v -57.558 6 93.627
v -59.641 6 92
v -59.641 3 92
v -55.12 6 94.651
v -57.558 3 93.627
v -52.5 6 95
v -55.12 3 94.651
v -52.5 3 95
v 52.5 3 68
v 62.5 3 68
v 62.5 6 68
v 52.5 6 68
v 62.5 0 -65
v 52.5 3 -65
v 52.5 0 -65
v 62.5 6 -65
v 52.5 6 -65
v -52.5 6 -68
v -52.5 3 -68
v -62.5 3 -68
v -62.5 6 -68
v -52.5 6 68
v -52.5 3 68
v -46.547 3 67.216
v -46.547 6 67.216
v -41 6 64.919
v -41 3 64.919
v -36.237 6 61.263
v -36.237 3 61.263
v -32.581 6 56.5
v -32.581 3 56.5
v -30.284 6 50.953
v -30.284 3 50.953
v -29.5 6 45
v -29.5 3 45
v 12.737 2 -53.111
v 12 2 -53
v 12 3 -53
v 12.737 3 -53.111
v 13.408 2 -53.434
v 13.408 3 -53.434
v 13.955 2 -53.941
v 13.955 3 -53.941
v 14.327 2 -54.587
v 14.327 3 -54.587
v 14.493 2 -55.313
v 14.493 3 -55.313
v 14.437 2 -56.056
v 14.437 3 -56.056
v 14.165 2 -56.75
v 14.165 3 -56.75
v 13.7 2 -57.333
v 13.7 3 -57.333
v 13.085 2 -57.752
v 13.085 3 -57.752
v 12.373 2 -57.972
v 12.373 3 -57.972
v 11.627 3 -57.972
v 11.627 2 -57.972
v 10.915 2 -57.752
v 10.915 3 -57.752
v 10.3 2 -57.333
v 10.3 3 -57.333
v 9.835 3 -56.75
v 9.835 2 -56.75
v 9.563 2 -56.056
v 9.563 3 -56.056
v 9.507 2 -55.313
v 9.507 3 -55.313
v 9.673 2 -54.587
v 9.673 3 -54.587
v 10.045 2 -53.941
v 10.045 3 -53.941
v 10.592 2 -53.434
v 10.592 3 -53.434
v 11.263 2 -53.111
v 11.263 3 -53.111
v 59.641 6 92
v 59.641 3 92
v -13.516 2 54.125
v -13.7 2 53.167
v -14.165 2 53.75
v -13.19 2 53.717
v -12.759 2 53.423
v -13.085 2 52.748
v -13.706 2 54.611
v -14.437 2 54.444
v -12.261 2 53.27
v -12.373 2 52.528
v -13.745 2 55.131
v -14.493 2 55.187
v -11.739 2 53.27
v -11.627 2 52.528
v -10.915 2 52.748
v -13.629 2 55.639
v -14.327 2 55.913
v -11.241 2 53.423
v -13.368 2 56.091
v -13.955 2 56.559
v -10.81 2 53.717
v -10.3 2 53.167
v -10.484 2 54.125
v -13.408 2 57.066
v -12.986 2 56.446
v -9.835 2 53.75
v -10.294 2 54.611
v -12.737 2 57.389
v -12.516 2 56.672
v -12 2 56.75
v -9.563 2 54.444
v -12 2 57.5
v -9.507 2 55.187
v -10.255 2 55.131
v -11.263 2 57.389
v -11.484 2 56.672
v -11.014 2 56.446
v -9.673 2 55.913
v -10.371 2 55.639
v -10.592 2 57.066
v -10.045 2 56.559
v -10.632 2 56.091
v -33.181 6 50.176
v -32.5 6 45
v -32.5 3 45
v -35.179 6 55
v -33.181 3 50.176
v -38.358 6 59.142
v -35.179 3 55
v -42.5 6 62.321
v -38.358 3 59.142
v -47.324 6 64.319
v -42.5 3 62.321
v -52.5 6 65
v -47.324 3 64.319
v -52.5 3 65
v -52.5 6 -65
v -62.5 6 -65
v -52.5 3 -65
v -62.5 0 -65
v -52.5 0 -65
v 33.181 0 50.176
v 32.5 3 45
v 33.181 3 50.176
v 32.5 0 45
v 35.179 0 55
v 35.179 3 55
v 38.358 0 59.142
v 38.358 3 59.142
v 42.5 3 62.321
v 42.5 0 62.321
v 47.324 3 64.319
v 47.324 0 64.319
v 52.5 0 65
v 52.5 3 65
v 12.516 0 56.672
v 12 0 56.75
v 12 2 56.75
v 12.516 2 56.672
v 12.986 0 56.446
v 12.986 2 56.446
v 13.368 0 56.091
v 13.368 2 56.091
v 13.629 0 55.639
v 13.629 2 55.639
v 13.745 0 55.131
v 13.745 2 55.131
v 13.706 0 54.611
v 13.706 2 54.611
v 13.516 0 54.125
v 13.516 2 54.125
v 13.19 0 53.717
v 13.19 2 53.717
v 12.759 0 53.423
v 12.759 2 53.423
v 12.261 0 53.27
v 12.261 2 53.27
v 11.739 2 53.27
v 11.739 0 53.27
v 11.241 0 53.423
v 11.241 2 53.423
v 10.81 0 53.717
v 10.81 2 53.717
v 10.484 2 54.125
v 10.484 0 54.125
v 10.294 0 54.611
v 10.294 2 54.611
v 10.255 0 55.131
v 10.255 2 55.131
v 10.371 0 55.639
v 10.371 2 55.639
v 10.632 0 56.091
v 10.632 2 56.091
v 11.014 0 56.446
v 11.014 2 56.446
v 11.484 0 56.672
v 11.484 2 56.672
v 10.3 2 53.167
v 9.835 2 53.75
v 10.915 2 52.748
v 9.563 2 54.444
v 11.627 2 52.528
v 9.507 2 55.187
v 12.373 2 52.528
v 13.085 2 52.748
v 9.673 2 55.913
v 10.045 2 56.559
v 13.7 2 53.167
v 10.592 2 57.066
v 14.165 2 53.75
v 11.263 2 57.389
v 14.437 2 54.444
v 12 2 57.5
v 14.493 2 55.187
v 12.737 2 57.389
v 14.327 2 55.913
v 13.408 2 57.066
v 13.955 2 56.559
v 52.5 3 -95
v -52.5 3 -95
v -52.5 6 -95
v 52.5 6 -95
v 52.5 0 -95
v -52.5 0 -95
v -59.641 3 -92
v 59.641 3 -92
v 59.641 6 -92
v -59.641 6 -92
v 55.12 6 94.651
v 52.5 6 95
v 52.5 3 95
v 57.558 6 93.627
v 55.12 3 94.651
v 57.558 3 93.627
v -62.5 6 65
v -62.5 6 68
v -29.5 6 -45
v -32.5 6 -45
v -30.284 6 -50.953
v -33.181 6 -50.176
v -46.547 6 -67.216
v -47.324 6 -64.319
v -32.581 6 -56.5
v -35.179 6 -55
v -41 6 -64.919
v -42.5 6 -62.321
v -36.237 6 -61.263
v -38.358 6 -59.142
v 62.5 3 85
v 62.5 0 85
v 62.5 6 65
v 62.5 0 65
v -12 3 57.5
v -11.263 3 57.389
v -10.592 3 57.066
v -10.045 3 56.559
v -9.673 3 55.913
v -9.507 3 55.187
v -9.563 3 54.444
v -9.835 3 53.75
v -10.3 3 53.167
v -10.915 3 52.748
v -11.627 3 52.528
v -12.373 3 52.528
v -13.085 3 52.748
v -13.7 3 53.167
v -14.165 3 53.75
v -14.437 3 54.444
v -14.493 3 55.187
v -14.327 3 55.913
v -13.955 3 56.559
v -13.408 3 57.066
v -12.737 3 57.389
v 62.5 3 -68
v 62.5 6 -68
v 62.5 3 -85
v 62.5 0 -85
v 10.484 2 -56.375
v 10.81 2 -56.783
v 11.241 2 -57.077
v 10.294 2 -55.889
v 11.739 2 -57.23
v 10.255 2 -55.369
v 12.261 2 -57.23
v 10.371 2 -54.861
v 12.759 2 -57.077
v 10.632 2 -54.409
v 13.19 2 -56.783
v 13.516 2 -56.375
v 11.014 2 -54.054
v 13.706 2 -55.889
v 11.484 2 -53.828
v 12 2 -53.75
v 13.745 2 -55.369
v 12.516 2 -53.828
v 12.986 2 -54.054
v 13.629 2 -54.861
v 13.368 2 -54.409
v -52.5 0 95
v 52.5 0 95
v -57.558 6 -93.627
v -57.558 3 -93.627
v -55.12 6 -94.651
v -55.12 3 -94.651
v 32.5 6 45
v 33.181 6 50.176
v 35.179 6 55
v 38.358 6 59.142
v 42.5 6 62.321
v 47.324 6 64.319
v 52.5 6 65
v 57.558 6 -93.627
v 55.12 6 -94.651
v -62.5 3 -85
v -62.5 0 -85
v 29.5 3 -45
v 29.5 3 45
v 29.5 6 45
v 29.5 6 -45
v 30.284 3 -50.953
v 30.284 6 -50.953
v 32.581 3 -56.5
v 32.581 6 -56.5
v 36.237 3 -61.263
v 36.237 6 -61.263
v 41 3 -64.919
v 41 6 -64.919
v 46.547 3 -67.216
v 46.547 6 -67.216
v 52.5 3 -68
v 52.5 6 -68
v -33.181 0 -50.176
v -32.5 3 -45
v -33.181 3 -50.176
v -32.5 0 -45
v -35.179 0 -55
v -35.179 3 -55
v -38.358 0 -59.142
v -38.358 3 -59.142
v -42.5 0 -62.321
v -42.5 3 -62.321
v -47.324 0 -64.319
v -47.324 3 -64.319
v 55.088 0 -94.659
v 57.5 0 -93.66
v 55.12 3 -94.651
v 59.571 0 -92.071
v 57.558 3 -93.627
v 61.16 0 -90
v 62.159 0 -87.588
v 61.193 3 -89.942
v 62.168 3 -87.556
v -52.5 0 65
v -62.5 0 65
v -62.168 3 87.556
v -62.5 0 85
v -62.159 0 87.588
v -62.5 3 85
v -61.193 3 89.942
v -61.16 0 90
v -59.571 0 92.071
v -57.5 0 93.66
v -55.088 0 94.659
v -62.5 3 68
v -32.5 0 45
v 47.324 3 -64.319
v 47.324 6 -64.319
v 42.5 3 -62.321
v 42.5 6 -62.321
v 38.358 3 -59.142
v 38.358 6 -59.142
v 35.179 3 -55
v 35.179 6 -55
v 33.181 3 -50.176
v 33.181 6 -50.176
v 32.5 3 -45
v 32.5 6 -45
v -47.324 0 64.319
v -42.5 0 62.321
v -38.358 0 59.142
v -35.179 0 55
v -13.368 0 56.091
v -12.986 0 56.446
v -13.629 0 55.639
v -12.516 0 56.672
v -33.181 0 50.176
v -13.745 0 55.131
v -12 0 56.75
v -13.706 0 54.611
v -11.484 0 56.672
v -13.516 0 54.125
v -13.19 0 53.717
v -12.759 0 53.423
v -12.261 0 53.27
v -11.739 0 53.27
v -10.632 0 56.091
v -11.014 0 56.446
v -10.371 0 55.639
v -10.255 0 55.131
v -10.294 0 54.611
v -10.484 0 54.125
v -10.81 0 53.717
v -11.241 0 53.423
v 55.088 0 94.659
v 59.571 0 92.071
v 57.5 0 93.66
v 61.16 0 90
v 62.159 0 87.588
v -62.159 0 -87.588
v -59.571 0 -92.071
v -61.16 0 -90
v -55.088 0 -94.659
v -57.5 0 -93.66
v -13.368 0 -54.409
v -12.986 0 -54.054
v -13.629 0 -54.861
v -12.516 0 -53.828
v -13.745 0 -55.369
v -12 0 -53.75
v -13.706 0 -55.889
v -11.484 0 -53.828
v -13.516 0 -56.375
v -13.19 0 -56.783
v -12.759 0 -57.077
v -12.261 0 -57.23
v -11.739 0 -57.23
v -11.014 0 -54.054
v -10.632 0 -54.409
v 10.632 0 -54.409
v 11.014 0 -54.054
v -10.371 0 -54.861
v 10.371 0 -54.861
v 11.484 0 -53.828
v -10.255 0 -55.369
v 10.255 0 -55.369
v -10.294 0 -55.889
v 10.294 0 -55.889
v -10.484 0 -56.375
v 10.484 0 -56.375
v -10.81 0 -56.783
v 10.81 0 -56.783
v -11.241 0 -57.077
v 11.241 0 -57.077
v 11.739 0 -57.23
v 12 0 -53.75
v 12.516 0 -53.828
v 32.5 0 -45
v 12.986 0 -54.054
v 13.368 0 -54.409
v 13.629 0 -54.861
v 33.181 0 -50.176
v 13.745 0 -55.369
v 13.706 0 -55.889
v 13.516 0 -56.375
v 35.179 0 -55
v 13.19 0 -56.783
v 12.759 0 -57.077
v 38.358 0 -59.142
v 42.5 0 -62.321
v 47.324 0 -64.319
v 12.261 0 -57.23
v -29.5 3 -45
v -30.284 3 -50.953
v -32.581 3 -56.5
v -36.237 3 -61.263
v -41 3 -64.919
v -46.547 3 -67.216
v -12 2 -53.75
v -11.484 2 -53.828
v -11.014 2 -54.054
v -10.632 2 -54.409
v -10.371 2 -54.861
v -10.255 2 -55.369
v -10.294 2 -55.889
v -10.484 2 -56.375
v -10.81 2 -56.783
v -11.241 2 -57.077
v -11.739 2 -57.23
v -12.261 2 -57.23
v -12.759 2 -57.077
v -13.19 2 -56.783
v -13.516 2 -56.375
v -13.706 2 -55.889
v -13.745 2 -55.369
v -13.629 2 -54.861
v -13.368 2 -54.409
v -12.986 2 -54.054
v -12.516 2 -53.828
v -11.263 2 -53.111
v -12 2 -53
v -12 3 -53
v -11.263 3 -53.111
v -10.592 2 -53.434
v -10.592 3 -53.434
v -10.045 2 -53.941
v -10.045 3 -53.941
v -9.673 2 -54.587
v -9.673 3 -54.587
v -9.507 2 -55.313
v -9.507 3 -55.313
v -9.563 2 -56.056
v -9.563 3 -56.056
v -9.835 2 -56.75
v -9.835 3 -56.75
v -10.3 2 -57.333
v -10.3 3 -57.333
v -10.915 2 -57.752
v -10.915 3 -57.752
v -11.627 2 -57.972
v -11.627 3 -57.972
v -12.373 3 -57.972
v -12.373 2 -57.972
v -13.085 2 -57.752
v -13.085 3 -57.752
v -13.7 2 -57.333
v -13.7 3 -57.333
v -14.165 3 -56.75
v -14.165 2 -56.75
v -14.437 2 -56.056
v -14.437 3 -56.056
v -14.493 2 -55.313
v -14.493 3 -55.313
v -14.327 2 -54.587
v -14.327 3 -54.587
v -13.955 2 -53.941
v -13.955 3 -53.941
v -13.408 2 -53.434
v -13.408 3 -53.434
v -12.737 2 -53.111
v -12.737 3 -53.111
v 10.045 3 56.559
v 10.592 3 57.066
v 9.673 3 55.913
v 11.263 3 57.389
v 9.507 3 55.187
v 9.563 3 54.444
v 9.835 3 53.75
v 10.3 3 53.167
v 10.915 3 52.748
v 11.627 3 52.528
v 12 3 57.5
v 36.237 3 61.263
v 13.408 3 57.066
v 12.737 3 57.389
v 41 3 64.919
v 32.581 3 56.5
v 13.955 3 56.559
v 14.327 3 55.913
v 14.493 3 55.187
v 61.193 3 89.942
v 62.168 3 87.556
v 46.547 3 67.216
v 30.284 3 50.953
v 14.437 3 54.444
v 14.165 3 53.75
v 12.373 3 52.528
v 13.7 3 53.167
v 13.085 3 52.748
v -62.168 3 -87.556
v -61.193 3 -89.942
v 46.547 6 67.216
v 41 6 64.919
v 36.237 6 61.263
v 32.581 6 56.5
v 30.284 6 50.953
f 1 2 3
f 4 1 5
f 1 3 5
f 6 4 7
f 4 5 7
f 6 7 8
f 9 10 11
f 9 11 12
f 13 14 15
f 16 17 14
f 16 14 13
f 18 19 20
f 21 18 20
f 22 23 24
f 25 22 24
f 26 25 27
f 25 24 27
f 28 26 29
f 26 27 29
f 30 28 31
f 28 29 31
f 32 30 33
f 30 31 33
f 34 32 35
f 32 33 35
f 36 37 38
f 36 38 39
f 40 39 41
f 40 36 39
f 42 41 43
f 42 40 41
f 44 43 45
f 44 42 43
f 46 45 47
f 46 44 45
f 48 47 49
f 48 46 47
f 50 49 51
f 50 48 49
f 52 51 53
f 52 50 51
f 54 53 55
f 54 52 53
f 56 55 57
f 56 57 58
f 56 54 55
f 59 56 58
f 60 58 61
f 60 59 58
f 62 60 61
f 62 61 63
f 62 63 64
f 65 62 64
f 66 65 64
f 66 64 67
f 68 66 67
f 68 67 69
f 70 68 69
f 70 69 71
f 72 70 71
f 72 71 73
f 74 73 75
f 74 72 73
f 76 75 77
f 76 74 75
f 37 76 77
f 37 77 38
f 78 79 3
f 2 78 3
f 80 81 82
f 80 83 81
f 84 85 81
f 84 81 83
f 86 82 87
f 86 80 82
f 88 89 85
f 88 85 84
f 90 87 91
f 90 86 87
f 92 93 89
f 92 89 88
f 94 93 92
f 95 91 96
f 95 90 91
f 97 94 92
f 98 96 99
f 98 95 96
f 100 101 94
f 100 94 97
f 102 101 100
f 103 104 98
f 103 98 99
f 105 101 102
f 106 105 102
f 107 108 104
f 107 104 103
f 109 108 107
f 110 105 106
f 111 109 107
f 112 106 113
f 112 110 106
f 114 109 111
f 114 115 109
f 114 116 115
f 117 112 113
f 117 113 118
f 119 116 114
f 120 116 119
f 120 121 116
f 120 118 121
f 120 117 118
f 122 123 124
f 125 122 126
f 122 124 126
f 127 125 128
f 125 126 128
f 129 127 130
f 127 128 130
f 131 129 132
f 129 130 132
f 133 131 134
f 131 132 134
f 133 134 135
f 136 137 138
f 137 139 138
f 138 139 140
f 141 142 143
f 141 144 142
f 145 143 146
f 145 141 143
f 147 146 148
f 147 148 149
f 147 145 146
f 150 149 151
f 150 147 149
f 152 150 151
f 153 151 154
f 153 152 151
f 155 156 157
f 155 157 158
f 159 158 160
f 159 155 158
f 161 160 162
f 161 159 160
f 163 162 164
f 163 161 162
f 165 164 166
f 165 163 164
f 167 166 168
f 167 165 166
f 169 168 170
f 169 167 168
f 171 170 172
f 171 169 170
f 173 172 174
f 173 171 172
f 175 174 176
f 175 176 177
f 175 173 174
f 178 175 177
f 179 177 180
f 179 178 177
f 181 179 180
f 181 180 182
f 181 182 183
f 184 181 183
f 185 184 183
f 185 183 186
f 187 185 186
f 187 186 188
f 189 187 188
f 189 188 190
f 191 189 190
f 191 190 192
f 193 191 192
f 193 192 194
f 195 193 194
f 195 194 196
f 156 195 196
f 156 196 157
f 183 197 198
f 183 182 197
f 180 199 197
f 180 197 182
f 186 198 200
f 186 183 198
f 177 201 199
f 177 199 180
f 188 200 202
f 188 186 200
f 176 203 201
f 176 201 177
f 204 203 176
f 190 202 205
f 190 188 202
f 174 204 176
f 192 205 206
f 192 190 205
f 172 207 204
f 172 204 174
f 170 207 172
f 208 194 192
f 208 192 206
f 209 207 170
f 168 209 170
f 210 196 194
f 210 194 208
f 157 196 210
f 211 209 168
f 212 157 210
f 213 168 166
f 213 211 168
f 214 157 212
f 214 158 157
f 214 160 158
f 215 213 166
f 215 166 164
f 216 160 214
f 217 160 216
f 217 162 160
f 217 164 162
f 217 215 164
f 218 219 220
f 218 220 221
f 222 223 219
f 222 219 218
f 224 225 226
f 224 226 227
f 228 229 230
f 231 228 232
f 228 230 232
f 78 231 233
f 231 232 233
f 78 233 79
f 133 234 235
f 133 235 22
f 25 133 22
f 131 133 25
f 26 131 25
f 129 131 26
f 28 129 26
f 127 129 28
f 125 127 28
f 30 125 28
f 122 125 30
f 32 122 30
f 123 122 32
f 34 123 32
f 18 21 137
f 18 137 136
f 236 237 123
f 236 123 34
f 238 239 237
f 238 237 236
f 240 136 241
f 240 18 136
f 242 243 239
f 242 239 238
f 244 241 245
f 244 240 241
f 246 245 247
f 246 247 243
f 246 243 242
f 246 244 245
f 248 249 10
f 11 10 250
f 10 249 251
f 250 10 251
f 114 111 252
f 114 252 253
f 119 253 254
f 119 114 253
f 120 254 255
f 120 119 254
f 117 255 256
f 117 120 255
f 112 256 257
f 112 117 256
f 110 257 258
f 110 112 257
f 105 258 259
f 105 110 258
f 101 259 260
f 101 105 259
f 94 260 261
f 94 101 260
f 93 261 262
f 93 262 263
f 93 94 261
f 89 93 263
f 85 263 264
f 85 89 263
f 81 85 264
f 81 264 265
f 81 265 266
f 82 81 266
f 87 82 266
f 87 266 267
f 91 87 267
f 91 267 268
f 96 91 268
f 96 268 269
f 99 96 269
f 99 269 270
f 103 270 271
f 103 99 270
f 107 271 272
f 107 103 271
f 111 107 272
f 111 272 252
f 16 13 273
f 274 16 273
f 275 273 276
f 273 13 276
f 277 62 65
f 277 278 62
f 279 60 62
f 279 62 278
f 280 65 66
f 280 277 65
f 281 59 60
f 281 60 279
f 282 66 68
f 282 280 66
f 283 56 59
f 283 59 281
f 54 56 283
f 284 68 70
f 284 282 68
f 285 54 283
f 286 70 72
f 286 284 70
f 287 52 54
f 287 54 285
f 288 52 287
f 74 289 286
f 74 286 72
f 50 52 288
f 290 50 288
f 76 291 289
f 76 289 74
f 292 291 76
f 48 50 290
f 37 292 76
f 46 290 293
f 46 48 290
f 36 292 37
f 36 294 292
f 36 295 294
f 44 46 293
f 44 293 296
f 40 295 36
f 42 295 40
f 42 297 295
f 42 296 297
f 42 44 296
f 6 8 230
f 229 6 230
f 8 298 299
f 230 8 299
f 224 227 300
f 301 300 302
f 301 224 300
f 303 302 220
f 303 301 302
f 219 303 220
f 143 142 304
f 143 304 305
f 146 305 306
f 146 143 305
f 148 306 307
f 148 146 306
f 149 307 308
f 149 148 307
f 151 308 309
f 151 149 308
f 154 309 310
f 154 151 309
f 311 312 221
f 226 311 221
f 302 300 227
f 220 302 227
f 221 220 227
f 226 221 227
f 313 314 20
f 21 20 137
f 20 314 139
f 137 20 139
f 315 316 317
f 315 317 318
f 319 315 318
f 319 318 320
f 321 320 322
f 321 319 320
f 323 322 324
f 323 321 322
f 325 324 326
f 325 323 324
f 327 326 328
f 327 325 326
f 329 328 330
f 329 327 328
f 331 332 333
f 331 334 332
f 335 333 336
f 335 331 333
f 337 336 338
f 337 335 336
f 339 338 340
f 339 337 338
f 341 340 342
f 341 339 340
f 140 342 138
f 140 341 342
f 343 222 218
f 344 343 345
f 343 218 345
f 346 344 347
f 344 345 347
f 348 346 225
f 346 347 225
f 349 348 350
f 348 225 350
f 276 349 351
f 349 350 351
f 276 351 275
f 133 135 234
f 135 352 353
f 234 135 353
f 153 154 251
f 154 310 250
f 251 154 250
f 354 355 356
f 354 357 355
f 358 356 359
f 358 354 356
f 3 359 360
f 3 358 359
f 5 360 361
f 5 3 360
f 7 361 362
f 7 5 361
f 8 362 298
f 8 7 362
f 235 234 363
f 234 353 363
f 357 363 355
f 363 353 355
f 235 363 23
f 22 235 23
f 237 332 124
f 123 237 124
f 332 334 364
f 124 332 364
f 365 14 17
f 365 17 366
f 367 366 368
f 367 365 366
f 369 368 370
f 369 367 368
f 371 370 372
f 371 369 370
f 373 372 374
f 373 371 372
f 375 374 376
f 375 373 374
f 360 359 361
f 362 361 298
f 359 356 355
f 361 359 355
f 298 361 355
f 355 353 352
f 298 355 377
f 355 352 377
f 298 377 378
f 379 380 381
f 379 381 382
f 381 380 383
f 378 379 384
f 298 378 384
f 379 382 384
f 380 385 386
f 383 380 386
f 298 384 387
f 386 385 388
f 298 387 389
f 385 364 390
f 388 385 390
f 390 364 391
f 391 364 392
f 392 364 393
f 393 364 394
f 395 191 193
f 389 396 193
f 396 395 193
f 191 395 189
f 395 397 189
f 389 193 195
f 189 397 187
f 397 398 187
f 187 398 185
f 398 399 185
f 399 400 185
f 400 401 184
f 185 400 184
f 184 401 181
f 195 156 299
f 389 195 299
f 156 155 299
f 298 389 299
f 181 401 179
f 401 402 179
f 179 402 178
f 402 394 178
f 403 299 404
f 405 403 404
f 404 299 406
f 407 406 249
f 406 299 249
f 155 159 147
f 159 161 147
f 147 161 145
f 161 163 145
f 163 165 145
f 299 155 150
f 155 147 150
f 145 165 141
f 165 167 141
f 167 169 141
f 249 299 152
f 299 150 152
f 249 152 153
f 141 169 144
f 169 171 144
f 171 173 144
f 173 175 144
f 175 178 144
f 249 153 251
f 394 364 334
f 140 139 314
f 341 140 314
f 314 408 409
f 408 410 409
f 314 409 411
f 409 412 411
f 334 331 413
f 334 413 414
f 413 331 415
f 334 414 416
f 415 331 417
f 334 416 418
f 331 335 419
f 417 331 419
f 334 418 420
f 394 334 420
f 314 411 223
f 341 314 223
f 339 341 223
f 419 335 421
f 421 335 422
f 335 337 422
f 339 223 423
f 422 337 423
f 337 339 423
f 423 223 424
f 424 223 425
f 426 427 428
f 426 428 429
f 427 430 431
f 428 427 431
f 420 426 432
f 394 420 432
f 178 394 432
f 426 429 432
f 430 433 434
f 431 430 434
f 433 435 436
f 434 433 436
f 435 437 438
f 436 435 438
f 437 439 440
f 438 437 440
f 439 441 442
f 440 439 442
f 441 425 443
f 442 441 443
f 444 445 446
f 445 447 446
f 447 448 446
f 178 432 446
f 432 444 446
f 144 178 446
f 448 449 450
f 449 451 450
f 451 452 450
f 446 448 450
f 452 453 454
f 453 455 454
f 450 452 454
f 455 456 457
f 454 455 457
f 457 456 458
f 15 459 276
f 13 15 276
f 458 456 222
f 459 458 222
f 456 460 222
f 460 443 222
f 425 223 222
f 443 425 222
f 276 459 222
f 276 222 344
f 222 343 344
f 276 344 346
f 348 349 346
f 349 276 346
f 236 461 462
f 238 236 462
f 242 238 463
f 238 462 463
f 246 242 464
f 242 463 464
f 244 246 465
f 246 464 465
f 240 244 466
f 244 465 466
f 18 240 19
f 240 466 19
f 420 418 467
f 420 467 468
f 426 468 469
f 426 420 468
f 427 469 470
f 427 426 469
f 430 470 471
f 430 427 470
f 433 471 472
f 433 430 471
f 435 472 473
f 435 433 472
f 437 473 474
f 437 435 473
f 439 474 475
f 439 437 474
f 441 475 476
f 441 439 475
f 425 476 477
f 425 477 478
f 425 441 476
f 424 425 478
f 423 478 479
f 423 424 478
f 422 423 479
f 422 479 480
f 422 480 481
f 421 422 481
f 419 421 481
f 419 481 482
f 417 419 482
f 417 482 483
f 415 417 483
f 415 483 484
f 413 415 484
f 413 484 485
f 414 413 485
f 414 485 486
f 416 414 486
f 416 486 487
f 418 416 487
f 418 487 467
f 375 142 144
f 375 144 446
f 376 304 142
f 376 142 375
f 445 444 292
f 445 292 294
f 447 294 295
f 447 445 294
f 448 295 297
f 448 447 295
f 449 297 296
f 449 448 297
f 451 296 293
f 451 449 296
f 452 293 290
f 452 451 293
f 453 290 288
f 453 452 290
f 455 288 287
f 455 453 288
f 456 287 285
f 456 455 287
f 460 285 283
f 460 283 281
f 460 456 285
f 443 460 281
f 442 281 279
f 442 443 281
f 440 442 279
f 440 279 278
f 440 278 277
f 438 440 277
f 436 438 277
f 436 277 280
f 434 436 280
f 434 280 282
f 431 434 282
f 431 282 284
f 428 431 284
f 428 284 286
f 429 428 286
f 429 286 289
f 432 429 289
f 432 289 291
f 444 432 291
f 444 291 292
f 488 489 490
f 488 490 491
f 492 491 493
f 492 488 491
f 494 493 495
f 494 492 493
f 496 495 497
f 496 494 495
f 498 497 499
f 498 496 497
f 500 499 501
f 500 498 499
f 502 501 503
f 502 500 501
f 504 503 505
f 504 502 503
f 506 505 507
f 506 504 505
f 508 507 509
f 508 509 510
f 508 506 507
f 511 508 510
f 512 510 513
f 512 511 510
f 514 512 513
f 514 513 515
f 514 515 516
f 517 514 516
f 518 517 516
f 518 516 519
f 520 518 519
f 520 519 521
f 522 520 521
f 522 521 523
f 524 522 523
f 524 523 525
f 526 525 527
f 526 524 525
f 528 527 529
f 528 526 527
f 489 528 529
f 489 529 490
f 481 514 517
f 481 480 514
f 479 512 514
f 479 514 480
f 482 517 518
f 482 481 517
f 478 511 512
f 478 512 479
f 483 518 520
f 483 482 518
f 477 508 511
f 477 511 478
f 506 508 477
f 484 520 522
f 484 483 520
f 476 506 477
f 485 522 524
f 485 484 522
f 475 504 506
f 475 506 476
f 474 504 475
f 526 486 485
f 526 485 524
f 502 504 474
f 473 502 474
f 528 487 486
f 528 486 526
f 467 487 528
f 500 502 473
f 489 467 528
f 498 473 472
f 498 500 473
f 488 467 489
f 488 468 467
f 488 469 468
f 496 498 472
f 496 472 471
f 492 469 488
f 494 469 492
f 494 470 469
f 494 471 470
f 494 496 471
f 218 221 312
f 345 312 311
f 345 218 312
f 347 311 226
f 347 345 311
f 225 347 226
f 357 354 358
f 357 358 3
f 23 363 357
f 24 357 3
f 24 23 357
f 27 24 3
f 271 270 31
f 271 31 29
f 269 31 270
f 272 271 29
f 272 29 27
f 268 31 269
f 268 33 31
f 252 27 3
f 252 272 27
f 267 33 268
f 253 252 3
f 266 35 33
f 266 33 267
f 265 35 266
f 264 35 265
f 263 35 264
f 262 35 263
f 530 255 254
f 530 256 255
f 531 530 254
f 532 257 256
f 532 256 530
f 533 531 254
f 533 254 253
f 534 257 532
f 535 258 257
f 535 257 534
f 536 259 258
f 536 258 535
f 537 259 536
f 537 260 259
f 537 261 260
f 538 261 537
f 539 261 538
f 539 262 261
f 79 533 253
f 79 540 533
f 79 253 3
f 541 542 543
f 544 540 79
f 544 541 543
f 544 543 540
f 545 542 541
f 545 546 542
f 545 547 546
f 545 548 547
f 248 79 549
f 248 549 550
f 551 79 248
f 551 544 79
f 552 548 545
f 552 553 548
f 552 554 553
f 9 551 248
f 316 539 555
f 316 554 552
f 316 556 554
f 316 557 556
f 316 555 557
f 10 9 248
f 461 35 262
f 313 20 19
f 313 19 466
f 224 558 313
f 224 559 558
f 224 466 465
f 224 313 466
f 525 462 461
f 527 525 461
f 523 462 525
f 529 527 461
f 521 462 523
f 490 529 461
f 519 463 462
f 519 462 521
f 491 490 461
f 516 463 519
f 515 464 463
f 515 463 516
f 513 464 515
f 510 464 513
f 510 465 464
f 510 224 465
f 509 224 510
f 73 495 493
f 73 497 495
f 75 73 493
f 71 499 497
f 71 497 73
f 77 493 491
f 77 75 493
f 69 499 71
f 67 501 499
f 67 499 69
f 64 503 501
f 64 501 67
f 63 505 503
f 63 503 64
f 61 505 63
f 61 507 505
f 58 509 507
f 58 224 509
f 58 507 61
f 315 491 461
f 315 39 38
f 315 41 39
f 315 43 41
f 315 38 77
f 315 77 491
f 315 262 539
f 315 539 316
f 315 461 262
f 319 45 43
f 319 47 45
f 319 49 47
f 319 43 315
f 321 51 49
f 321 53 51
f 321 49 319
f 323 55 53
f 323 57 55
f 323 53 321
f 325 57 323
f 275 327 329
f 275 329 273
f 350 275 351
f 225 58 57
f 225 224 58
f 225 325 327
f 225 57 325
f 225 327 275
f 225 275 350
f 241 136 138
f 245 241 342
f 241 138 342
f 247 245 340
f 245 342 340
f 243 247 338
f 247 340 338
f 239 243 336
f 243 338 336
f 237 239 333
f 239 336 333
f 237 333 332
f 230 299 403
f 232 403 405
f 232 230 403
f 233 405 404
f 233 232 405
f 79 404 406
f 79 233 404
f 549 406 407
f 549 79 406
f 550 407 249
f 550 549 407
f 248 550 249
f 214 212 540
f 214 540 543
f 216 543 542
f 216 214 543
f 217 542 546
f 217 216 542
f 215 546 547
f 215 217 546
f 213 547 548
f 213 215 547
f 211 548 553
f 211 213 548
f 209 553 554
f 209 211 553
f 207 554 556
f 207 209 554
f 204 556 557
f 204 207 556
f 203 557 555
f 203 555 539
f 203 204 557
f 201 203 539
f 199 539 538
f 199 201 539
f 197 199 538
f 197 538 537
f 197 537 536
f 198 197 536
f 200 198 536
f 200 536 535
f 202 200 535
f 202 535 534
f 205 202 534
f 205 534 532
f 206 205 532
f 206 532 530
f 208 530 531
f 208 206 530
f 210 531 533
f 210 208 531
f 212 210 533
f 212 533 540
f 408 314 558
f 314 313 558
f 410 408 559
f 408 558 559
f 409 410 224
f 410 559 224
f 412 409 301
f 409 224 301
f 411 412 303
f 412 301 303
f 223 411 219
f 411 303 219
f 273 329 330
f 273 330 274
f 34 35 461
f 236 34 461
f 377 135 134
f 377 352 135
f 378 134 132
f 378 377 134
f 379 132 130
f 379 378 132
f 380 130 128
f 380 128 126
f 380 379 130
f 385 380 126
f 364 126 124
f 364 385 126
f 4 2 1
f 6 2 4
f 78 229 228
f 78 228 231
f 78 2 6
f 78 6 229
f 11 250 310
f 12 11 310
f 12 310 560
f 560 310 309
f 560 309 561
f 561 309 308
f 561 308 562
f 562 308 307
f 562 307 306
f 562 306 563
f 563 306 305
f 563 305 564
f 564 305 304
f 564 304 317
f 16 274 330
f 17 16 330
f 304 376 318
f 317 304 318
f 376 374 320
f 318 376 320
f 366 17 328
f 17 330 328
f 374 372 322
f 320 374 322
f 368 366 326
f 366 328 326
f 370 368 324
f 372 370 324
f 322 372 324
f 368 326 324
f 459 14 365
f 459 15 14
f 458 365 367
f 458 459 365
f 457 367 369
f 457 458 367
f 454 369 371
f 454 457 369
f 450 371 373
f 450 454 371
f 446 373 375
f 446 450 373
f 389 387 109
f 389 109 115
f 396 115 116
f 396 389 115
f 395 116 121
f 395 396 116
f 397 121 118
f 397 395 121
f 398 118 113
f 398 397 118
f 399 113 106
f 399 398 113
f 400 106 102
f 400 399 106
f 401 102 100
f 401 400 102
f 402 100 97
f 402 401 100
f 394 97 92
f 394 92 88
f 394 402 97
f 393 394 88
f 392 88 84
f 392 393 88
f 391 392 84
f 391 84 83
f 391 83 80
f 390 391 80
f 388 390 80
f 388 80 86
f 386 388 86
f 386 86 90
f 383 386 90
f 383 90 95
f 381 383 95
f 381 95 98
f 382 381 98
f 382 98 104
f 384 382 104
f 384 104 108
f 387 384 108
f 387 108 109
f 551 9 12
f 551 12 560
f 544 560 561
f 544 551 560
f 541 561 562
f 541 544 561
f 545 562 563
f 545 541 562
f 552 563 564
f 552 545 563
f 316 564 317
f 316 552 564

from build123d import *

# Parameters (mm, degrees)
SKETCH1_W           = 125
SKETCH1_H           = 190
SKETCH1_R           = 2.5
SKETCH1_R_2         = 1.75
BOSS_EXTRUDE1_DEPTH = 3
CUT_EXTRUDE1_START  = 2
SKETCH1_3_R         = 2.5
SKETCH1_3_R_2       = 1.75
CUT_EXTRUDE1_DEPTH  = 1
SKETCH2_W           = 30
SKETCH2_H           = 130
CUT_EXTRUDE2_DEPTH  = 114.75521966
FILLET1_R           = 20
FILLET2_R           = 10
BOSS_EXTRUDE2_DEPTH = 3


with BuildPart() as part:
    # Sketch1 → Boss-Extrude1 (new body)
    # profile 1 of 5: a face of its own
    with BuildSketch(Plane(origin=(0, 0, 0), x_dir=(1, 0, 0), z_dir=(0, 1, 0))):
        Rectangle(SKETCH1_W, SKETCH1_H)
        with Locations((-12, 55.5)):
            Circle(SKETCH1_R, mode=Mode.SUBTRACT)
        with Locations((12, 55.5)):
            Circle(SKETCH1_R, mode=Mode.SUBTRACT)
        with Locations((-12, -55)):
            Circle(SKETCH1_R, mode=Mode.SUBTRACT)
        with Locations((12, -55)):
            Circle(SKETCH1_R, mode=Mode.SUBTRACT)
    # profile 2 of 5: a face of its own
    with BuildSketch(Plane(origin=(0, 0, 0), x_dir=(1, 0, 0), z_dir=(0, 1, 0))):
        with Locations((-12, -55)):
            Circle(SKETCH1_R)
        with Locations(Location((-12, -55, 0), (0, 0, 270))):
            Circle(SKETCH1_R_2, mode=Mode.SUBTRACT)
    # profile 3 of 5: a face of its own
    with BuildSketch(Plane(origin=(0, 0, 0), x_dir=(1, 0, 0), z_dir=(0, 1, 0))):
        with Locations((12, -55)):
            Circle(SKETCH1_R)
        with Locations(Location((12, -55, 0), (0, 0, 270))):
            Circle(SKETCH1_R_2, mode=Mode.SUBTRACT)
    # profile 4 of 5: a face of its own
    with BuildSketch(Plane(origin=(0, 0, 0), x_dir=(1, 0, 0), z_dir=(0, 1, 0))):
        with Locations((12, 55.5)):
            Circle(SKETCH1_R)
        with Locations(Location((12, 55.5, 0), (0, 0, 270))):
            Circle(SKETCH1_R_2, mode=Mode.SUBTRACT)
    # profile 5 of 5: a face of its own
    with BuildSketch(Plane(origin=(0, 0, 0), x_dir=(1, 0, 0), z_dir=(0, 1, 0))):
        with Locations((-12, 55.5)):
            Circle(SKETCH1_R)
        with Locations(Location((-12, 55.5, 0), (0, 0, 270))):
            Circle(SKETCH1_R_2, mode=Mode.SUBTRACT)
    extrude(amount=BOSS_EXTRUDE1_DEPTH)

    # Sketch1<3> → Cut-Extrude1 (cut)
    # profile 1 of 4: a face of its own
    with BuildSketch(Plane(origin=(0, 0, 0), x_dir=(1, 0, 0), z_dir=(0, 1, 0)).offset(CUT_EXTRUDE1_START)):
        with Locations(Location((-12, -55, 0), (0, 0, 270))):
            Circle(SKETCH1_3_R)
        with Locations(Location((-12, -55, 0), (0, 0, 270))):
            Circle(SKETCH1_3_R_2, mode=Mode.SUBTRACT)
    # profile 2 of 4: a face of its own
    with BuildSketch(Plane(origin=(0, 0, 0), x_dir=(1, 0, 0), z_dir=(0, 1, 0)).offset(CUT_EXTRUDE1_START)):
        with Locations(Location((12, 55.5, 0), (0, 0, 270))):
            Circle(SKETCH1_3_R)
        with Locations(Location((12, 55.5, 0), (0, 0, 270))):
            Circle(SKETCH1_3_R_2, mode=Mode.SUBTRACT)
    # profile 3 of 4: a face of its own
    with BuildSketch(Plane(origin=(0, 0, 0), x_dir=(1, 0, 0), z_dir=(0, 1, 0)).offset(CUT_EXTRUDE1_START)):
        with Locations(Location((-12, 55.5, 0), (0, 0, 270))):
            Circle(SKETCH1_3_R)
        with Locations(Location((-12, 55.5, 0), (0, 0, 270))):
            Circle(SKETCH1_3_R_2, mode=Mode.SUBTRACT)
    # profile 4 of 4: a face of its own
    with BuildSketch(Plane(origin=(0, 0, 0), x_dir=(1, 0, 0), z_dir=(0, 1, 0)).offset(CUT_EXTRUDE1_START)):
        with Locations(Location((12, -55, 0), (0, 0, 270))):
            Circle(SKETCH1_3_R)
        with Locations(Location((12, -55, 0), (0, 0, 270))):
            Circle(SKETCH1_3_R_2, mode=Mode.SUBTRACT)
    extrude(amount=CUT_EXTRUDE1_DEPTH, mode=Mode.SUBTRACT)

    # Sketch2 → Cut-Extrude2 (cut, through all)
    with BuildSketch(Plane(origin=(0, 3, 0), x_dir=(1, 0, 0), z_dir=(0, 1, 0))):
        with Locations((47.5, 0)):
            Rectangle(SKETCH2_W, SKETCH2_H)
        with Locations((-47.5, 0)):
            Rectangle(SKETCH2_W, SKETCH2_H)
    extrude(amount=-CUT_EXTRUDE2_DEPTH, mode=Mode.SUBTRACT)

    # Fillet1
    fillet1_edges = [part.edges().sort_by_distance(p)[0] for p in [
        (32.5, 1.5, 65),
        (32.5, 1.5, -65),
        (-32.5, 1.5, -65),
        (-32.5, 1.5, 65),
    ]]
    fillet(fillet1_edges, radius=FILLET1_R)

    # Fillet2
    fillet2_edges = [part.edges().sort_by_distance(p)[0] for p in [
        (-62.5, 1.5, 95),
        (-62.5, 1.5, -95),
        (62.5, 1.5, -95),
        (62.5, 1.5, 95),
    ]]
    fillet(fillet2_edges, radius=FILLET2_R)

    # Sketch3 → Boss-Extrude2 (add)
    with BuildSketch(Plane(origin=(0, 3, 0), x_dir=(1, 0, 0), z_dir=(0, 1, 0))):
        with BuildLine():
            Line((-59.5, 68), (-62.5, 68))
            Line((-62.5, 68), (-62.5, 65))
            Line((-62.5, 65), (-52.5, 65))
            ThreePointArc((-52.5, 65), (-38.357864376, 59.142135624), (-32.5, 45))
            Line((-32.5, 45), (-32.5, -45))
            ThreePointArc((-32.5, -45), (-38.357864376, -59.142135624), (-52.5, -65))
            Line((-52.5, -65), (-62.5, -65))
            Line((-62.5, -65), (-62.5, -68))
            Line((-62.5, -68), (-59.5, -68))
            Line((-59.5, -68), (-52.5, -68))
            ThreePointArc((-52.5, -68), (-36.236544033, -61.263455967), (-29.5, -45))
            Line((-29.5, -45), (-29.5, 45))
            ThreePointArc((-29.5, 45), (-36.236544033, 61.263455967), (-52.5, 68))
            Line((-52.5, 68), (-59.5, 68))
        make_face()
        with BuildLine():
            Line((59.5, 68), (62.5, 68))
            Line((62.5, 68), (62.5, 65))
            Line((62.5, 65), (52.5, 65))
            ThreePointArc((52.5, 65), (38.357864376, 59.142135624), (32.5, 45))
            Line((32.5, 45), (32.5, -45))
            ThreePointArc((32.5, -45), (38.357864376, -59.142135624), (52.5, -65))
            Line((52.5, -65), (62.5, -65))
            Line((62.5, -65), (62.5, -68))
            Line((62.5, -68), (59.5, -68))
            Line((59.5, -68), (52.5, -68))
            ThreePointArc((52.5, -68), (36.236544033, -61.263455967), (29.5, -45))
            Line((29.5, -45), (29.5, 45))
            ThreePointArc((29.5, 45), (36.236544033, 61.263455967), (52.5, 68))
            Line((52.5, 68), (59.5, 68))
        make_face()
        with BuildLine():
            Line((-52.5, -92), (-59.641428429, -92))
            ThreePointArc((-59.641428429, -92), (-56.372983346, -94.219544457), (-52.5, -95))
            Line((-52.5, -95), (52.5, -95))
            ThreePointArc((52.5, -95), (56.372983346, -94.219544457), (59.641428429, -92))
            Line((59.641428429, -92), (52.5, -92))
            Line((52.5, -92), (-52.5, -92))
        make_face()
        with BuildLine():
            Line((-52.5, 92), (-59.641428429, 92))
            ThreePointArc((-59.641428429, 92), (-56.372983346, 94.219544457), (-52.5, 95))
            Line((-52.5, 95), (52.5, 95))
            ThreePointArc((52.5, 95), (56.372983346, 94.219544457), (59.641428429, 92))
            Line((59.641428429, 92), (52.5, 92))
            Line((52.5, 92), (-52.5, 92))
        make_face()
    extrude(amount=BOSS_EXTRUDE2_DEPTH)


solid = part.part
